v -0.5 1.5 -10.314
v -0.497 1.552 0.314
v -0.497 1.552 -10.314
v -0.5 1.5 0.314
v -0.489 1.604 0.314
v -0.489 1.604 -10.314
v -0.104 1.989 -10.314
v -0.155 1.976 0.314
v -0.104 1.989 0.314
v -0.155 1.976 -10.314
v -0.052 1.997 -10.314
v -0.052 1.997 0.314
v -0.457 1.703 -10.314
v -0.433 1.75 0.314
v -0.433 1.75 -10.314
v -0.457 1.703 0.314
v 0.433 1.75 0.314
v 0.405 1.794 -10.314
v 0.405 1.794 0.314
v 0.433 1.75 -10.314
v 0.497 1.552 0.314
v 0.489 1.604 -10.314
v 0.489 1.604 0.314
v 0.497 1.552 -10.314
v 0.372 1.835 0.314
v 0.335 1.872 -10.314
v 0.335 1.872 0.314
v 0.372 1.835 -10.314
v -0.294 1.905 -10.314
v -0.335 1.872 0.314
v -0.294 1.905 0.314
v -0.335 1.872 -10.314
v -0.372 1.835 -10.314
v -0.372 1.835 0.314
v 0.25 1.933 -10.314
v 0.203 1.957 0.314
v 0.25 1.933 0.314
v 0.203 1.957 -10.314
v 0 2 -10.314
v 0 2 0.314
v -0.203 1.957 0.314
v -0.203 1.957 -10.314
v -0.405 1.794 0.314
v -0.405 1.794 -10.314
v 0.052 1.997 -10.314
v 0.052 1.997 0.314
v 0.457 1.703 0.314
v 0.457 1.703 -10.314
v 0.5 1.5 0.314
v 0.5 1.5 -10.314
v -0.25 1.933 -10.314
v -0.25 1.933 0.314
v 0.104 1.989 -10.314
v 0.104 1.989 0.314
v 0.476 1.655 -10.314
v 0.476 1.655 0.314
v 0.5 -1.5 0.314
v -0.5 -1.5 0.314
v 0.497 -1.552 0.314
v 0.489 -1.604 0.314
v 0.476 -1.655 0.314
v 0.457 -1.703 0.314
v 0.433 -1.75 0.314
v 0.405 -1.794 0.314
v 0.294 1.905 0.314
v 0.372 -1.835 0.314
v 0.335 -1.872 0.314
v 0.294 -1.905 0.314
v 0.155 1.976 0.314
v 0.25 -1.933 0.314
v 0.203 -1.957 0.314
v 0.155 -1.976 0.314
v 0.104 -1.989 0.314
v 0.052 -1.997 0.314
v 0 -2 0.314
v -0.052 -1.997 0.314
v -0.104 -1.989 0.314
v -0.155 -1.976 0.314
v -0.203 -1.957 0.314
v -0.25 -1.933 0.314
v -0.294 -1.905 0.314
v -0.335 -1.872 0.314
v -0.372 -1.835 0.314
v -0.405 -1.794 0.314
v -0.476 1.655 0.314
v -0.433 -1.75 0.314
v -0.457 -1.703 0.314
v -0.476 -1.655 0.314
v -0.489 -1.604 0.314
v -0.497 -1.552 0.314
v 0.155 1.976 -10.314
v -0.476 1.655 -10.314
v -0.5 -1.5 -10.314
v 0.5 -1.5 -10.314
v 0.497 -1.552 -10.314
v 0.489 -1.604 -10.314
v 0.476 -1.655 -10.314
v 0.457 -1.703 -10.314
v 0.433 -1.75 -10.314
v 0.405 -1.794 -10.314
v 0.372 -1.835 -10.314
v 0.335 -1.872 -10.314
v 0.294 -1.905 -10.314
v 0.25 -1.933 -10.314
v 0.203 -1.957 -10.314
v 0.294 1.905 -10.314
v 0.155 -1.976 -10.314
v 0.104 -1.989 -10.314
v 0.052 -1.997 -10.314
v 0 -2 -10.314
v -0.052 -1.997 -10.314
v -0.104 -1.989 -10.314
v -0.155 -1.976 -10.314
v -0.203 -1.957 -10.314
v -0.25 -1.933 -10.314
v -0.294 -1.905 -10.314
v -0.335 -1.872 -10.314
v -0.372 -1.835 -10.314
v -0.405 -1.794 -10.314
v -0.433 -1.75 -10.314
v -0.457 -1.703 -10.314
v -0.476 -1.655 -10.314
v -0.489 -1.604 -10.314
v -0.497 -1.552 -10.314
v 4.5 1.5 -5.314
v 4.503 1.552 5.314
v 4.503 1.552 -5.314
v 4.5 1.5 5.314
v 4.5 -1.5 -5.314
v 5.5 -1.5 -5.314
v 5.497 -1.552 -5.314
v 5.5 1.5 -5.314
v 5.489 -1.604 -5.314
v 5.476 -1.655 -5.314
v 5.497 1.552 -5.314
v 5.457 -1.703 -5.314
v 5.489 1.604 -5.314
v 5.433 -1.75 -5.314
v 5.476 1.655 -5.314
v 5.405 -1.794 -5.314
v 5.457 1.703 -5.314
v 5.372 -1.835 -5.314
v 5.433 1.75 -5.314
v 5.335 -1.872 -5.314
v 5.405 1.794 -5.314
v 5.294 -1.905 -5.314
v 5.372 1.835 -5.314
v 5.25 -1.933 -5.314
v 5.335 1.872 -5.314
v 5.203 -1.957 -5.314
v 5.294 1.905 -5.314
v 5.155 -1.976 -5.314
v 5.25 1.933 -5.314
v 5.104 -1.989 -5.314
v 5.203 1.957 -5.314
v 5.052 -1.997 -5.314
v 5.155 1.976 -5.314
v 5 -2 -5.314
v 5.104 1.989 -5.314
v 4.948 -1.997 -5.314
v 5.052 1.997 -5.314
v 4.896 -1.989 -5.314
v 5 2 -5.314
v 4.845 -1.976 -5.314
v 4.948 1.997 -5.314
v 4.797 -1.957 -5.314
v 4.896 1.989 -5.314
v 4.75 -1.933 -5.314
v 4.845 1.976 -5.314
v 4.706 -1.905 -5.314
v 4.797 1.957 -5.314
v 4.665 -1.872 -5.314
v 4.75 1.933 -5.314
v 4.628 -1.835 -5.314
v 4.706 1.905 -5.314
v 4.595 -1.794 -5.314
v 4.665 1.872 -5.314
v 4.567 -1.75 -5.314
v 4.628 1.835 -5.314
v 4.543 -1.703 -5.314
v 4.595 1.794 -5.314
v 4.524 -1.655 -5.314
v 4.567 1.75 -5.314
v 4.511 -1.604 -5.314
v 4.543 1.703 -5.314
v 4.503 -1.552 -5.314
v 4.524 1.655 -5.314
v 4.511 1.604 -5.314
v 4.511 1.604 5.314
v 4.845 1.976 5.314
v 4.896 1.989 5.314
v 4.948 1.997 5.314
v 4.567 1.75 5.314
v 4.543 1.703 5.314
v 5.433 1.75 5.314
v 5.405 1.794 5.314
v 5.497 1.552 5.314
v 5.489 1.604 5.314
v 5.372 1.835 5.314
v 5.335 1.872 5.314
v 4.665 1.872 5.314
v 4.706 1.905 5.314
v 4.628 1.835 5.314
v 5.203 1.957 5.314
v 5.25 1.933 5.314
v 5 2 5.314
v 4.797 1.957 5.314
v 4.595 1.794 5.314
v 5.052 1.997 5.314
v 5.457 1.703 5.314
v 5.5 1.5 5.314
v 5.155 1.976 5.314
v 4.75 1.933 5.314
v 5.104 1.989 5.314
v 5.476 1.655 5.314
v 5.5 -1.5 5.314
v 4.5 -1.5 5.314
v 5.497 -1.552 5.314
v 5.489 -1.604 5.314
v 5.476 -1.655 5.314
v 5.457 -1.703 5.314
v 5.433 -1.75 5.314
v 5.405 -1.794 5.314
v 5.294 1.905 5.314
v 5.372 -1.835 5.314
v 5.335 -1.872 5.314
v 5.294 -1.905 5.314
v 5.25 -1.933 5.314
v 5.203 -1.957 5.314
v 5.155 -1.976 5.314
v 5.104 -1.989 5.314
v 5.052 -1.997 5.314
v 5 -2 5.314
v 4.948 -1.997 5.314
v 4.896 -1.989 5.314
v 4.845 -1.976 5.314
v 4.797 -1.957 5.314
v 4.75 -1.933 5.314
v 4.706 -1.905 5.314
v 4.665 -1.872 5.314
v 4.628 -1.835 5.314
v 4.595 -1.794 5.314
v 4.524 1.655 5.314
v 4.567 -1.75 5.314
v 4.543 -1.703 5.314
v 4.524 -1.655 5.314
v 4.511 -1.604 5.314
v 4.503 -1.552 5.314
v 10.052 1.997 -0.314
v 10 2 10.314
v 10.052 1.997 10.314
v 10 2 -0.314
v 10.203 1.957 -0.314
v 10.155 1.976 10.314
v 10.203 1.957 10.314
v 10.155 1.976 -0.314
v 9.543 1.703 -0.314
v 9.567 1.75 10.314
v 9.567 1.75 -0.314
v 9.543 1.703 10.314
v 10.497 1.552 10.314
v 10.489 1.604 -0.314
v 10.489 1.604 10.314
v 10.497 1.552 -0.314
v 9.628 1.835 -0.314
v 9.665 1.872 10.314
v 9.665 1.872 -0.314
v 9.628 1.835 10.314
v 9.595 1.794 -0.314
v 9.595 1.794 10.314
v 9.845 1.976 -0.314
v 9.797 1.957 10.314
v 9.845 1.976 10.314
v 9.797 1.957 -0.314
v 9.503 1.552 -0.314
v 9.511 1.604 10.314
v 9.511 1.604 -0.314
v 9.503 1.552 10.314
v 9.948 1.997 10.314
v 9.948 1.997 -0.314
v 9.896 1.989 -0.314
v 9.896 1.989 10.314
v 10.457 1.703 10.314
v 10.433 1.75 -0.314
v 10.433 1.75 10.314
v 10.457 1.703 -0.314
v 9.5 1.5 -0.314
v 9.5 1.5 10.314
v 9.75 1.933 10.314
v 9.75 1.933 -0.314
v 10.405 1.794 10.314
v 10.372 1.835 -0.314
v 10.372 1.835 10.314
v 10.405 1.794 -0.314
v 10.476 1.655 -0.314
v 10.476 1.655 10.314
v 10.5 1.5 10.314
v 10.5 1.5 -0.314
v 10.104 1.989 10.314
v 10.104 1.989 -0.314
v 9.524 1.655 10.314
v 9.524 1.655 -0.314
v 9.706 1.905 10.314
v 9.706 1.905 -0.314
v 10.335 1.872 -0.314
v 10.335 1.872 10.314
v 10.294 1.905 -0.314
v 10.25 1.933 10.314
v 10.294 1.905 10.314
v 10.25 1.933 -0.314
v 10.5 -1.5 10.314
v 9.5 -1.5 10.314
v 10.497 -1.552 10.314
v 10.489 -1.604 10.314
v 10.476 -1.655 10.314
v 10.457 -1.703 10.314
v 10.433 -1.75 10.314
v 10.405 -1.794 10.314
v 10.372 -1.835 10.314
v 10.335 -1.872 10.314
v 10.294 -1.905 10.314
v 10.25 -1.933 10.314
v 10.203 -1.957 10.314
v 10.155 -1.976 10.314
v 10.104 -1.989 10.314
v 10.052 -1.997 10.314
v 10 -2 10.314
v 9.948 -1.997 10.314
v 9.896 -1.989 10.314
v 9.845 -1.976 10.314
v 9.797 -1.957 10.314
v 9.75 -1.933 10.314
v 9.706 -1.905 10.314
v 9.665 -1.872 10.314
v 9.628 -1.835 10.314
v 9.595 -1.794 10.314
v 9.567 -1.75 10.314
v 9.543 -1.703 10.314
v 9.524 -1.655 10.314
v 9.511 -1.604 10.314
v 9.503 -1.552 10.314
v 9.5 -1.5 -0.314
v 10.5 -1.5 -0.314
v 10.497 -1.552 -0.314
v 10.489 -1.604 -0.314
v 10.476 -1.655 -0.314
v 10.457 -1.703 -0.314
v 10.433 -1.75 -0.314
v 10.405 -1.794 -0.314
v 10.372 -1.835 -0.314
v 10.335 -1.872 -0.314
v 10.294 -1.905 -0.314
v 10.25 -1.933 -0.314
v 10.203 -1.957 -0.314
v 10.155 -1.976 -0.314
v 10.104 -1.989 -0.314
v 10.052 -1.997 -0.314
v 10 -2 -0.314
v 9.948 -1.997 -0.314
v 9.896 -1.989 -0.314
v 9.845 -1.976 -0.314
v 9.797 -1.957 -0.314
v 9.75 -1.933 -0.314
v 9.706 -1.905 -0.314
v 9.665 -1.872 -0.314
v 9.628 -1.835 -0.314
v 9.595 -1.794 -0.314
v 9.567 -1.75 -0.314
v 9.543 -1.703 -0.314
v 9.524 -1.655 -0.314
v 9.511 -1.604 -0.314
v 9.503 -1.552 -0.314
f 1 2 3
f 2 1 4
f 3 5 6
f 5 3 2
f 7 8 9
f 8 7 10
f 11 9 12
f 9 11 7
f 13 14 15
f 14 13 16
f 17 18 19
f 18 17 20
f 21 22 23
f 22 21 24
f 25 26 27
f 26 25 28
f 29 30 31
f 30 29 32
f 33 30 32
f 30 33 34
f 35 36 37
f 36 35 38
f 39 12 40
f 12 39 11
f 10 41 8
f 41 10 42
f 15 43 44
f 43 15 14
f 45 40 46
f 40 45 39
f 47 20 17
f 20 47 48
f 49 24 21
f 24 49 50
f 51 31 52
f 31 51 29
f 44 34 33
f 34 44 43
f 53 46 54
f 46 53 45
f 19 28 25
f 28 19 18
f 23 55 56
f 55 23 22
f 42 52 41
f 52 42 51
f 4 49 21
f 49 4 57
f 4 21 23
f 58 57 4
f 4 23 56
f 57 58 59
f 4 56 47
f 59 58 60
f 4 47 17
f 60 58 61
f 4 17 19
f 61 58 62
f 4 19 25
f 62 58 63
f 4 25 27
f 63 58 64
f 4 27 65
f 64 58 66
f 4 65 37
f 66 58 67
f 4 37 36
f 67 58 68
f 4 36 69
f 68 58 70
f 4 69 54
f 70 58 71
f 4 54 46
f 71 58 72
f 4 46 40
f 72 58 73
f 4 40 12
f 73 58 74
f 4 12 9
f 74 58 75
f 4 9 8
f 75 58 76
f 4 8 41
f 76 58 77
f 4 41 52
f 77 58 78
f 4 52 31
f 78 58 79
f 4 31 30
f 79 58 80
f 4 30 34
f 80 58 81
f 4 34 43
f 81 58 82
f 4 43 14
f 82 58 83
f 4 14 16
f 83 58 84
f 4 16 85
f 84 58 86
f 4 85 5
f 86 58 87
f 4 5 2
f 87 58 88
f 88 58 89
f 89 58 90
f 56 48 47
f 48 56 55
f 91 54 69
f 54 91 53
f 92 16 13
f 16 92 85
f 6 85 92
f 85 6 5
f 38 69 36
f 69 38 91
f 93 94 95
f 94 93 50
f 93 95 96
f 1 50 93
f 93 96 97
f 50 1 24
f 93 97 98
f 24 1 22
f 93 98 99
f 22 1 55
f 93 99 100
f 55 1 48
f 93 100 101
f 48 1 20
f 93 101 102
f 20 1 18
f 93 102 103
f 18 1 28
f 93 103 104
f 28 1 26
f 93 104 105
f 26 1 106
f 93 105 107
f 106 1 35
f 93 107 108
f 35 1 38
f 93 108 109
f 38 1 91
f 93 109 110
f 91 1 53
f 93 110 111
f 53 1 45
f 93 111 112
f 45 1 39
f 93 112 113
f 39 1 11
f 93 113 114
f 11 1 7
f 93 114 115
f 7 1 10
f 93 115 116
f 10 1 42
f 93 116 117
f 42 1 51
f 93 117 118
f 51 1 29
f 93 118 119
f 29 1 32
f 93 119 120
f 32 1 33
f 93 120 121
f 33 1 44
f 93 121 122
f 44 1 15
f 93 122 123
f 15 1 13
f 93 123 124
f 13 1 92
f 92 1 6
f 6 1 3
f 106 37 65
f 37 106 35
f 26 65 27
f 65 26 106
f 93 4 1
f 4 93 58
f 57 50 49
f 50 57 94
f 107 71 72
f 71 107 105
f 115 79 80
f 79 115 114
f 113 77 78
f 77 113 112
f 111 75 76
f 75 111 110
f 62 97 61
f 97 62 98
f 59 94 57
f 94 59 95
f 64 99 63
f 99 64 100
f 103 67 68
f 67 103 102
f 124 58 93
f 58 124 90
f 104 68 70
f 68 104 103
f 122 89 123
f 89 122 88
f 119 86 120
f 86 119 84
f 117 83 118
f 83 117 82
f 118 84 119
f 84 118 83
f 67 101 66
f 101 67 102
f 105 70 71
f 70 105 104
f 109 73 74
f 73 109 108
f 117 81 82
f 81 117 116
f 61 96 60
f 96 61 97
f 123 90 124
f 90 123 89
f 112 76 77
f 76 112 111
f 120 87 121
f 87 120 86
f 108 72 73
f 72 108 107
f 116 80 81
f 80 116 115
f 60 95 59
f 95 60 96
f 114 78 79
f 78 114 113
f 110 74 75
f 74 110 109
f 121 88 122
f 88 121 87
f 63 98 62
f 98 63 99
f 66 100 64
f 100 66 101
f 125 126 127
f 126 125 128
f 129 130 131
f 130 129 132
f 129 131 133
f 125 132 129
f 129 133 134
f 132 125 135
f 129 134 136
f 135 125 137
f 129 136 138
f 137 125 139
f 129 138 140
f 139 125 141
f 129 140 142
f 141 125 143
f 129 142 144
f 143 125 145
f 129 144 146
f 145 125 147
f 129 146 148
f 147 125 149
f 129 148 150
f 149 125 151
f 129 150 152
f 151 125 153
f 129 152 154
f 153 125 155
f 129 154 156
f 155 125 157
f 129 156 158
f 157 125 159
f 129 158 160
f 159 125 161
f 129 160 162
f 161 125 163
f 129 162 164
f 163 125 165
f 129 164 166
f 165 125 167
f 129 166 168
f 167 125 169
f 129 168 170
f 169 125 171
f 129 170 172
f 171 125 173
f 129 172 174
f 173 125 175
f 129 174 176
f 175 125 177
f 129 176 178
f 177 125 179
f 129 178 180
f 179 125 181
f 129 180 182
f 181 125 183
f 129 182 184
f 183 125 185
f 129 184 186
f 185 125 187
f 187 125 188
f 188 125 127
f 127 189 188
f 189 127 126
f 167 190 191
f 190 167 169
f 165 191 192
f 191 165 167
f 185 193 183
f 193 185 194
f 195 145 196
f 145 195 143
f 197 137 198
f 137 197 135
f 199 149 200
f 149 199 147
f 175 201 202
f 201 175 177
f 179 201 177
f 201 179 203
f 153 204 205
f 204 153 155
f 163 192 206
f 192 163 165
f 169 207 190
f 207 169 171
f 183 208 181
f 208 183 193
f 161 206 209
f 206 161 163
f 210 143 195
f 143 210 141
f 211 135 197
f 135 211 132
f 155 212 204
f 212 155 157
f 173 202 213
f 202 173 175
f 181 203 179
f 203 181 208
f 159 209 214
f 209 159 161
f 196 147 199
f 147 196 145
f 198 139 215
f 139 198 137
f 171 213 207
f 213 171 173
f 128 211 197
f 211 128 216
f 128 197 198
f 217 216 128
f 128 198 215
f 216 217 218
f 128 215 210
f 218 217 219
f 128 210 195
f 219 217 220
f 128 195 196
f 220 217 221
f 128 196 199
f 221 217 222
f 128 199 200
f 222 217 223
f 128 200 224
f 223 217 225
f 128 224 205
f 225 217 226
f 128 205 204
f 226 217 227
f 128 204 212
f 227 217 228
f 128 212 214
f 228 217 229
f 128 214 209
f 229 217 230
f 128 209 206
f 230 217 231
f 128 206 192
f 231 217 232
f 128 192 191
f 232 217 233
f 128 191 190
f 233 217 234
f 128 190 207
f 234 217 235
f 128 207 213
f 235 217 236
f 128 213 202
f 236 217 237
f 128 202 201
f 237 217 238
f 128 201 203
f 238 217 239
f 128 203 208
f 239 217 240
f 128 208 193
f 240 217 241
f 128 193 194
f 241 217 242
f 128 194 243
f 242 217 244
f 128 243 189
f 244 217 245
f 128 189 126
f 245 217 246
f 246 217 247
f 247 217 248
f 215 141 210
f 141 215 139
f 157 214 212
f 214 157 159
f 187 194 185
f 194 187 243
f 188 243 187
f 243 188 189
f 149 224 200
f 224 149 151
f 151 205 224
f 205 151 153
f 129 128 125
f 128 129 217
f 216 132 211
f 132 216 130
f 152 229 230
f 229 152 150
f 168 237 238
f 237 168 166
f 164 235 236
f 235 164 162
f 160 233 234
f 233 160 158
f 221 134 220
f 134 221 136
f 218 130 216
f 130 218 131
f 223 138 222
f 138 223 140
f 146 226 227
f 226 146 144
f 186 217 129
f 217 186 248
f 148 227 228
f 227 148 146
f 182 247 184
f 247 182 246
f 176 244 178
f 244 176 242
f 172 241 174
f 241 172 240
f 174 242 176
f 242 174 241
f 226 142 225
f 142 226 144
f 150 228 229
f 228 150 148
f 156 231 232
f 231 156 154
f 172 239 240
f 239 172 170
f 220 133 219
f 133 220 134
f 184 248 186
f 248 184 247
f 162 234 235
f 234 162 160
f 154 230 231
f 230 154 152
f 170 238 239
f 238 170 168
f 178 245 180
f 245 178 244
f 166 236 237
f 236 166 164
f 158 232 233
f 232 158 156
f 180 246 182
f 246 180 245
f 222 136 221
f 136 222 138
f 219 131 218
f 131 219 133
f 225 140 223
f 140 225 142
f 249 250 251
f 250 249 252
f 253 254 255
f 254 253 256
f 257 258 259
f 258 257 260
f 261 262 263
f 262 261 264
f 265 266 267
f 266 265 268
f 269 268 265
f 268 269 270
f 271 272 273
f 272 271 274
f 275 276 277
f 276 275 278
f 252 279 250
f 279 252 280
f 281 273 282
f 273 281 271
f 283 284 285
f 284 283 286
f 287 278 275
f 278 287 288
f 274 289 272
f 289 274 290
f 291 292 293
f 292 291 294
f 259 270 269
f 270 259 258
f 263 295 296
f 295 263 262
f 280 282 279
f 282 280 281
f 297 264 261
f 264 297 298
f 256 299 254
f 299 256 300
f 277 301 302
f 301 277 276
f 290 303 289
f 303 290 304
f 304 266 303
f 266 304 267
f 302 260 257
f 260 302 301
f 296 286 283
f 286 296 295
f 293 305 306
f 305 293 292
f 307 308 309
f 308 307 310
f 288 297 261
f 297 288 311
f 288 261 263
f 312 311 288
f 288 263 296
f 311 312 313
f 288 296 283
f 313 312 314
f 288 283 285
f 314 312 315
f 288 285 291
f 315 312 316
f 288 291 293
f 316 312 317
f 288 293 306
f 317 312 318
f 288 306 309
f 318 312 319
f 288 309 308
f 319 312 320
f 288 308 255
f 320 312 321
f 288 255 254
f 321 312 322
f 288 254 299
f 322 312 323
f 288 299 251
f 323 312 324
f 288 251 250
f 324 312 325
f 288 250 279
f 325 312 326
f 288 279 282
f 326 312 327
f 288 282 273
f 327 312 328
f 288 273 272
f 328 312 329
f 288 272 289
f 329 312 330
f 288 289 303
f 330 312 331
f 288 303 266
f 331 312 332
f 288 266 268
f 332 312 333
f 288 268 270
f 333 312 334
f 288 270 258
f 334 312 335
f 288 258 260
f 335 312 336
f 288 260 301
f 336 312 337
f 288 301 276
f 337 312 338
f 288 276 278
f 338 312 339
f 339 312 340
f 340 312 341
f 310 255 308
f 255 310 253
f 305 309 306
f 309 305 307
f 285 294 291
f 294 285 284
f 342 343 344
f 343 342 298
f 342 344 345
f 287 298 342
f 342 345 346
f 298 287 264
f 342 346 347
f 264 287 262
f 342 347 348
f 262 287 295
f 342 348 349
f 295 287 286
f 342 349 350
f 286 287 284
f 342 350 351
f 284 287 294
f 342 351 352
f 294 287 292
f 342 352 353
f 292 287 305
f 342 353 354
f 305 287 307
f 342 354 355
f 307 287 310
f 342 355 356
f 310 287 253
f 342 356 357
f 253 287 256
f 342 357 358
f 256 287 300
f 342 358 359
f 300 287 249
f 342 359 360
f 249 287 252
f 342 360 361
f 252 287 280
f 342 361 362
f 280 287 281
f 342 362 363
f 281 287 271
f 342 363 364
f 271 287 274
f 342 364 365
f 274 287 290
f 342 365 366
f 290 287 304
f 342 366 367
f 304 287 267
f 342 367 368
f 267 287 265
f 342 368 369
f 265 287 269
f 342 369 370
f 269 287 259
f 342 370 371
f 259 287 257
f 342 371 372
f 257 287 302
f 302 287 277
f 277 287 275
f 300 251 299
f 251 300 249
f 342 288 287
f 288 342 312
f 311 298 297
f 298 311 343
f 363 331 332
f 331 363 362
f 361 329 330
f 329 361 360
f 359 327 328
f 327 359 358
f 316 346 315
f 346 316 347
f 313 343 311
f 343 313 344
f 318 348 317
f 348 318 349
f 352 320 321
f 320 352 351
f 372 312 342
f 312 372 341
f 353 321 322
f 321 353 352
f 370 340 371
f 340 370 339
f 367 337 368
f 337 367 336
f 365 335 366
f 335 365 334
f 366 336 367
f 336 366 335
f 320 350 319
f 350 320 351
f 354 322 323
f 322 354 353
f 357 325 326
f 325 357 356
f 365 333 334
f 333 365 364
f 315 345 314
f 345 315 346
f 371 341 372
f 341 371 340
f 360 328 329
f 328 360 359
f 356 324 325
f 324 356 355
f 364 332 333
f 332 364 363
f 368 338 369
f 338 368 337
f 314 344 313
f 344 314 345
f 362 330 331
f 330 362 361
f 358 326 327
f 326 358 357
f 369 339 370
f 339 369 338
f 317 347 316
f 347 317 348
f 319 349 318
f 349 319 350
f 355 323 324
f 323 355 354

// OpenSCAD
// Unit of length: Unit.MM
$fn = 60;

union()
{
   union()
   {
      translate(v = [0.0, 1.5, 0.0])
      {
         rotate_extrude(angle = 360.0, convexity = 2)
         {
            difference()
            {
               polygon(points = [[0.0, -10.314], [0.0, -10.0], [0.0, 0.0], [0.0, 0.314], [0.5, 0.314], [0.5, 0.0], [0.5, -10.0], [0.5, -10.314]]);
               translate(v = [-2.314, -0.314])
               {
                  polygon(points = [[-0.314, -0.314], [-0.314, 10.942], [2.314, 10.942], [2.314, 10.628], [2.314, 0.0], [2.314, -0.314]]);
               }
            }
         }
      }
      rotate(a = [90.0, 0.0, 0.0])
      {
         linear_extrude(height = 3.0, center = true, convexity = 2, twist = 0.0, scale = 1.0)
         {
            union()
            {
               difference()
               {
                  polygon(points = [[0.0, -10.314], [0.0, -10.0], [0.0, 0.0], [0.0, 0.314], [0.5, 0.314], [0.5, 0.0], [0.5, -10.0], [0.5, -10.314]]);
                  translate(v = [-2.314, -0.314])
                  {
                     polygon(points = [[-0.314, -0.314], [-0.314, 10.942], [2.314, 10.942], [2.314, 10.628], [2.314, 0.0], [2.314, -0.314]]);
                  }
               }
               rotate(a = [0.0, 180.0])
               {
                  difference()
                  {
                     polygon(points = [[0.0, -10.314], [0.0, -10.0], [0.0, 0.0], [0.0, 0.314], [0.5, 0.314], [0.5, 0.0], [0.5, -10.0], [0.5, -10.314]]);
                     translate(v = [-2.314, -0.314])
                     {
                        polygon(points = [[-0.314, -0.314], [-0.314, 10.942], [2.314, 10.942], [2.314, 10.628], [2.314, 0.0], [2.314, -0.314]]);
                     }
                  }
               }
            }
         }
      }
      translate(v = [0.0, -1.5, 0.0])
      {
         rotate_extrude(angle = 360.0, convexity = 2)
         {
            difference()
            {
               polygon(points = [[0.0, -10.314], [0.0, -10.0], [0.0, 0.0], [0.0, 0.314], [0.5, 0.314], [0.5, 0.0], [0.5, -10.0], [0.5, -10.314]]);
               translate(v = [-2.314, -0.314])
               {
                  polygon(points = [[-0.314, -0.314], [-0.314, 10.942], [2.314, 10.942], [2.314, 10.628], [2.314, 0.0], [2.314, -0.314]]);
               }
            }
         }
      }
   }
   translate(v = [5.0, 0.0, 0.0])
   {
      union()
      {
         translate(v = [0.0, 1.5, 0.0])
         {
            rotate_extrude(angle = 360.0, convexity = 2)
            {
               difference()
               {
                  polygon(points = [[0.0, -5.314], [0.0, -5.0], [0.0, 5.0], [0.0, 5.314], [0.5, 5.314], [0.5, 5.0], [0.5, -5.0], [0.5, -5.314]]);
                  translate(v = [-2.314, -0.314])
                  {
                     polygon(points = [[-0.314, -0.314], [-0.314, 10.942], [2.314, 10.942], [2.314, 10.628], [2.314, 0.0], [2.314, -0.314]]);
                  }
               }
            }
         }
         rotate(a = [90.0, 0.0, 0.0])
         {
            linear_extrude(height = 3.0, center = true, convexity = 2, twist = 0.0, scale = 1.0)
            {
               union()
               {
                  difference()
                  {
                     polygon(points = [[0.0, -5.314], [0.0, -5.0], [0.0, 5.0], [0.0, 5.314], [0.5, 5.314], [0.5, 5.0], [0.5, -5.0], [0.5, -5.314]]);
                     translate(v = [-2.314, -0.314])
                     {
                        polygon(points = [[-0.314, -0.314], [-0.314, 10.942], [2.314, 10.942], [2.314, 10.628], [2.314, 0.0], [2.314, -0.314]]);
                     }
                  }
                  rotate(a = [0.0, 180.0])
                  {
                     difference()
                     {
                        polygon(points = [[0.0, -5.314], [0.0, -5.0], [0.0, 5.0], [0.0, 5.314], [0.5, 5.314], [0.5, 5.0], [0.5, -5.0], [0.5, -5.314]]);
                        translate(v = [-2.314, -0.314])
                        {
                           polygon(points = [[-0.314, -0.314], [-0.314, 10.942], [2.314, 10.942], [2.314, 10.628], [2.314, 0.0], [2.314, -0.314]]);
                        }
                     }
                  }
               }
            }
         }
         translate(v = [0.0, -1.5, 0.0])
         {
            rotate_extrude(angle = 360.0, convexity = 2)
            {
               difference()
               {
                  polygon(points = [[0.0, -5.314], [0.0, -5.0], [0.0, 5.0], [0.0, 5.314], [0.5, 5.314], [0.5, 5.0], [0.5, -5.0], [0.5, -5.314]]);
                  translate(v = [-2.314, -0.314])
                  {
                     polygon(points = [[-0.314, -0.314], [-0.314, 10.942], [2.314, 10.942], [2.314, 10.628], [2.314, 0.0], [2.314, -0.314]]);
                  }
               }
            }
         }
      }
   }
   translate(v = [10.0, 0.0, 0.0])
   {
      union()
      {
         translate(v = [0.0, 1.5, 0.0])
         {
            rotate_extrude(angle = 360.0, convexity = 2)
            {
               difference()
               {
                  polygon(points = [[0.0, -0.314], [0.0, 0.0], [0.0, 10.0], [0.0, 10.314], [0.5, 10.314], [0.5, 10.0], [0.5, 0.0], [0.5, -0.314]]);
                  translate(v = [-2.314, -0.314])
                  {
                     polygon(points = [[-0.314, -0.314], [-0.314, 10.942], [2.314, 10.942], [2.314, 10.628], [2.314, 0.0], [2.314, -0.314]]);
                  }
               }
            }
         }
         rotate(a = [90.0, 0.0, 0.0])
         {
            linear_extrude(height = 3.0, center = true, convexity = 2, twist = 0.0, scale = 1.0)
            {
               union()
               {
                  difference()
                  {
                     polygon(points = [[0.0, -0.314], [0.0, 0.0], [0.0, 10.0], [0.0, 10.314], [0.5, 10.314], [0.5, 10.0], [0.5, 0.0], [0.5, -0.314]]);
                     translate(v = [-2.314, -0.314])
                     {
                        polygon(points = [[-0.314, -0.314], [-0.314, 10.942], [2.314, 10.942], [2.314, 10.628], [2.314, 0.0], [2.314, -0.314]]);
                     }
                  }
                  rotate(a = [0.0, 180.0])
                  {
                     difference()
                     {
                        polygon(points = [[0.0, -0.314], [0.0, 0.0], [0.0, 10.0], [0.0, 10.314], [0.5, 10.314], [0.5, 10.0], [0.5, 0.0], [0.5, -0.314]]);
                        translate(v = [-2.314, -0.314])
                        {
                           polygon(points = [[-0.314, -0.314], [-0.314, 10.942], [2.314, 10.942], [2.314, 10.628], [2.314, 0.0], [2.314, -0.314]]);
                        }
                     }
                  }
               }
            }
         }
         translate(v = [0.0, -1.5, 0.0])
         {
            rotate_extrude(angle = 360.0, convexity = 2)
            {
               difference()
               {
                  polygon(points = [[0.0, -0.314], [0.0, 0.0], [0.0, 10.0], [0.0, 10.314], [0.5, 10.314], [0.5, 10.0], [0.5, 0.0], [0.5, -0.314]]);
                  translate(v = [-2.314, -0.314])
                  {
                     polygon(points = [[-0.314, -0.314], [-0.314, 10.942], [2.314, 10.942], [2.314, 10.628], [2.314, 0.0], [2.314, -0.314]]);
                  }
               }
            }
         }
      }
   }
}
